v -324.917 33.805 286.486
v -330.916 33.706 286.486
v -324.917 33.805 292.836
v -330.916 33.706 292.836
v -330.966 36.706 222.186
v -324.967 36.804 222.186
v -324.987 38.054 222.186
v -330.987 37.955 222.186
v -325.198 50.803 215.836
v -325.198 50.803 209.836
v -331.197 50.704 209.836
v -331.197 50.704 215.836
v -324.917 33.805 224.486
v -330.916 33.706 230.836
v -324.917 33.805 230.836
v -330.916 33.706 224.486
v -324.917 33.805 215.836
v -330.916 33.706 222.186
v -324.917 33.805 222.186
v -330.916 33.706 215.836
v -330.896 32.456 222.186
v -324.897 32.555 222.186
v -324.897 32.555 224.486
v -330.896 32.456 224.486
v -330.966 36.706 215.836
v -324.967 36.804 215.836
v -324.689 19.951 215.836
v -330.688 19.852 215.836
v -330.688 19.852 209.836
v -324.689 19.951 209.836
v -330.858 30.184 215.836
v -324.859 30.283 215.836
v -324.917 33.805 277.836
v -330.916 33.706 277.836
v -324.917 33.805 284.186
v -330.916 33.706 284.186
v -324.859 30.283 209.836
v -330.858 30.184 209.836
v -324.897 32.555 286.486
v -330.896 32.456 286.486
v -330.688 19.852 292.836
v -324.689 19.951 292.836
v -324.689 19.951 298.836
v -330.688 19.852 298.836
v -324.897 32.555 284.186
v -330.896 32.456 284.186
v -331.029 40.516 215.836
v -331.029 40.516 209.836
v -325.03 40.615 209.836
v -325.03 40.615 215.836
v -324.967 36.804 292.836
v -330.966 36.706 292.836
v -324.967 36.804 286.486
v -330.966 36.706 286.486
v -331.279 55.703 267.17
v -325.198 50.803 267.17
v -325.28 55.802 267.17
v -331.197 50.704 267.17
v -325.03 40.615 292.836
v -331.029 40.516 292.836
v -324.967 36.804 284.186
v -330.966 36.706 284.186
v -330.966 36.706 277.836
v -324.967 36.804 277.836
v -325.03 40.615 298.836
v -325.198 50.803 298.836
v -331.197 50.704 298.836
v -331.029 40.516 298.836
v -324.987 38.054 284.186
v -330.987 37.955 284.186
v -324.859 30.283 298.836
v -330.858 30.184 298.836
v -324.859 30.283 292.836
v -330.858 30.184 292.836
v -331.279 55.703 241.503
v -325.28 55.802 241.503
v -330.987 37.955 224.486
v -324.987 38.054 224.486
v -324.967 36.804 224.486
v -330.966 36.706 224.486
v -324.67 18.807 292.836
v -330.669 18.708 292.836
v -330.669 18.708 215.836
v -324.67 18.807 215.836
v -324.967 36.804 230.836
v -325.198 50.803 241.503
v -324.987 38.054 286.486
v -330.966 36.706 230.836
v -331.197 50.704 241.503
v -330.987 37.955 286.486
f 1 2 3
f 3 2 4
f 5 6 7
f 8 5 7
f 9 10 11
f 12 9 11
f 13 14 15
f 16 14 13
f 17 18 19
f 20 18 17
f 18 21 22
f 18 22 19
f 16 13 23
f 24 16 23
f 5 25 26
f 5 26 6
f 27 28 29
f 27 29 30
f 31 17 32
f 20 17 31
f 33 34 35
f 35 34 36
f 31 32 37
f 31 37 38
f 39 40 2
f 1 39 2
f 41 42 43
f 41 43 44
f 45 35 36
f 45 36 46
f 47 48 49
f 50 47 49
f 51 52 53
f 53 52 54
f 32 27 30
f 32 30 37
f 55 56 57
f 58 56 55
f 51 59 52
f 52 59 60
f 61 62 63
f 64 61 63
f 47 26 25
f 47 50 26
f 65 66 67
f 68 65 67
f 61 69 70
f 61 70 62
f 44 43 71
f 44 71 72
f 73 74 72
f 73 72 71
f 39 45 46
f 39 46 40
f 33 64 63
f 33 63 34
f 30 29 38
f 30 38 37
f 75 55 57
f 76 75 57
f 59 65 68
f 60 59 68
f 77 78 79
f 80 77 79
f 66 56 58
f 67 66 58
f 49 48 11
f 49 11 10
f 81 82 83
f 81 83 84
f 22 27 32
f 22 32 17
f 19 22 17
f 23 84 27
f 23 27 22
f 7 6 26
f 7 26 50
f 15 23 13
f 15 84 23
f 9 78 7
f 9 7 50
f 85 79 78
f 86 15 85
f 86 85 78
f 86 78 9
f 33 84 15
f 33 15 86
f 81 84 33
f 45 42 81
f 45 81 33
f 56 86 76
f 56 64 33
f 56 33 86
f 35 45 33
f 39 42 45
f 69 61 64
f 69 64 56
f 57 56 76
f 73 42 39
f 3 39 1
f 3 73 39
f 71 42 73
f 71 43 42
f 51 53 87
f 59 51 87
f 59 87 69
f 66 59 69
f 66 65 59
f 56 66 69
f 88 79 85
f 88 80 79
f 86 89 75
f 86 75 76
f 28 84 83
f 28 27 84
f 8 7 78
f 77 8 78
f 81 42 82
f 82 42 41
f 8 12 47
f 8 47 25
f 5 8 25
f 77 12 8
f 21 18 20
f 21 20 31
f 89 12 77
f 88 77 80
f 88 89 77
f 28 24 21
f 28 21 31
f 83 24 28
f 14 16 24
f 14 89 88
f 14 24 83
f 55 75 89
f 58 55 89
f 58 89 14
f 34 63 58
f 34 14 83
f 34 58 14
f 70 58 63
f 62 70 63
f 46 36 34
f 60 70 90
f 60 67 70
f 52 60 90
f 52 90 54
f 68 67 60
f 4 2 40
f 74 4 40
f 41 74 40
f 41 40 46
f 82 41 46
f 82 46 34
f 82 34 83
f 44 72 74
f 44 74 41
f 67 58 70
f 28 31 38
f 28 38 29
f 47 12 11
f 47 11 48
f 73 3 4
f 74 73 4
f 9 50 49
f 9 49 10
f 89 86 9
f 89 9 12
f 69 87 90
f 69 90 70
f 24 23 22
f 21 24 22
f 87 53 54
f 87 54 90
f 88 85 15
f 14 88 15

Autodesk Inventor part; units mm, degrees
ref_plane "РабПлоскость1" through (-327.803629, 8.784154, 215.836479) normal (0, 0, 1) x (1, 0, 0)
sketch "Эскиз1" plane through (-327.803629, 8.784154, 215.836479) normal (0, 0, 1) x (1, 0, 0)
  line L0 (3.114831, 11.166777) -> (2.944416, 21.498705)
  line L1 (2.944416, 21.498705) -> (-3.054768, 21.399754)
  line L2 (-3.054768, 21.399754) -> (-2.884353, 11.067826)
  line L3 (-2.884353, 11.067826) -> (3.114831, 11.166777)
  line L4 (-3.393221, 41.919489) -> (-3.225183, 31.731682)
  line L5 (2.774001, 31.830633) -> (2.605963, 42.01844)
  line L6 (-3.225183, 31.731682) -> (2.774001, 31.830633)
  line L7 (2.605963, 42.01844) -> (-3.393221, 41.919489)
  line L8 (2.774001, 31.830633) -> (2.605963, 42.01844) construction
  line L9 (-3.393221, 41.919489) -> (-3.225183, 31.731682) construction
  line L10 (3.114831, 11.166777) -> (2.944416, 21.498705) construction
  line L11 (-3.054768, 21.399754) -> (-2.884353, 11.067826) construction
  line L12 (6.149374, 48.077701) -> (19.433282, 48.296806) construction
  line L13 (2.605963, 42.01844) -> (6.248325, 42.078517) construction
  point P0 (327.803629, -8.784154)
  dimension "d16" = 6
extrude "Выдавливание1" add sketch "Эскиз1" against normal blind 6
ref_plane "РабПлоскость2" through (-327.498735, 8.403036, 292.836479) normal (0, 0, -1) x (-0.999864, -0.0164918, 0)
sketch "Эскиз2" plane through (-327.498735, 8.403036, 292.836479) normal (0, 0, -1) x (-0.999864, -0.0164918, 0)
  line L0 (-3, 21.833317) -> (3, 21.833317)
  line L1 (3, 21.833317) -> (3, 11.499984)
  line L2 (3, 11.5) -> (-3, 11.5)
  line L3 (-3, 11.499984) -> (-3, 21.833317)
  line L4 (3, 32.16665) -> (-3, 32.16665)
  line L5 (-3, 32.16665) -> (-3, 42.355843)
  line L6 (-3, 42.5) -> (3, 42.5)
  line L7 (3, 42.355843) -> (3, 32.16665)
  line L8 (-3, 11.499984) -> (-3, 21.833317) construction
  line L9 (3, 21.833317) -> (3, 11.499984) construction
  line L10 (-3, 32.16665) -> (-3, 42.355843) construction
  line L11 (3, 42.355843) -> (3, 32.16665) construction
  point P0 (-327.315615, -13.802923)
sketch "Эскиз2 outline for Выдавливание2" plane through (-327.498735, 8.403036, 292.836479) normal (0, 0, -1) x (-0.999864, -0.0164918, 0)
  line L0 (3, 32.16665) -> (3, 42.355843)
  line L1 (-3, 32.16665) -> (3, 32.16665)
  line L2 (-3, 42.355843) -> (-3, 32.16665)
  line L3 (3, 42.355843) -> (-3, 42.355843)
  line L4 (-3, 21.833317) -> (-3, 11.499984)
  line L5 (3, 21.833317) -> (-3, 21.833317)
  line L6 (3, 11.499984) -> (3, 21.833317)
  line L7 (-3, 11.499984) -> (3, 11.499984)
extrude "Выдавливание2" add sketch "Эскиз2 outline for Выдавливание2" against normal blind 6
sketch "Эскиз3" plane through (-327.498735, 8.403036, 292.836479) normal (0, 0, -1) x (-0.999864, -0.0164918, 0)
  circle A0 centre (0, -7.644157) radius 18
  line L0 (6.642857, 42.355843) -> (3, 42.355843)
  line L1 (-3, 32.166667) -> (-3, 21.833333)
  line L2 (-3, 21.833333) -> (3, 21.833333)
  line L3 (3, 21.833333) -> (3, 32.166667)
  line L4 (3, 32.166667) -> (-3, 32.166667)
  line L5 (-3, 42.355843) -> (3, 42.355843)
  line L6 (3, 42.355843) -> (3, 10.355843)
  line L7 (3, 10.355843) -> (-3, 10.355843)
  line L8 (-3, 10.355843) -> (-3, 42.355843)
  point P0 (-327.315615, -13.802923)
  point P1 (-3, 21.833333)
  point P2 (3, 21.833333)
  point P3 (3, 42.355843)
extrude "Выдавливание3" add sketch "Эскиз3" along normal up to surface (77 mm away) contours L7 L8 L2 L6 | L2 L1 L4 L3 | L4 L8 L5 L6
sketch "Эскиз4" plane through (-331.19685, 50.703643, 209.836479) normal (-0.999864, -0.0164918, 0) x (0, 0, 1)
  line L0 (0, -14) -> (6, -14) construction
  line L1 (0, -17) -> (6, -17) construction
  line L2 (6, -17) -> (6, -14)
  line L3 (6, -14) -> (12.35, -14)
  line L4 (12.35, -14) -> (12.35, -12.75)
  line L5 (12.35, -12.75) -> (14.65, -12.75)
  line L6 (14.65, -12.75) -> (14.65, -14)
  line L7 (14.65, -14) -> (21, -14)
  line L8 (21, -14) -> (21, -17)
  line L9 (21, -17) -> (14.65, -17)
  line L10 (14.65, -17) -> (14.65, -18.25)
  line L11 (14.65, -18.25) -> (12.35, -18.25)
  line L12 (12.35, -18.25) -> (12.35, -17)
  line L13 (12.35, -17) -> (6, -17)
  line L14 (0, -20.522506) -> (0, -30.855843) construction
  line L15 (89, -10.189193) -> (89, 0) construction
  line L16 (0, -30.855843) -> (89, 0) construction
  line L17 (44.5, 0) -> (44.5, -30.855843) construction
  line L18 (89, -14) -> (83, -14) construction
  line L19 (89, -17) -> (83, -17) construction
  line L20 (83, -17) -> (83, -14)
  line L21 (83, -14) -> (76.65, -14)
  line L22 (76.65, -14) -> (76.65, -12.75)
  line L23 (76.65, -12.75) -> (74.35, -12.75)
  line L24 (74.35, -12.75) -> (74.35, -14)
  line L25 (74.35, -14) -> (68, -14)
  line L26 (68, -14) -> (68, -17)
  line L27 (68, -17) -> (74.35, -17)
  line L28 (74.35, -17) -> (74.35, -18.25)
  line L29 (74.35, -18.25) -> (76.65, -18.25)
  line L30 (76.65, -18.25) -> (76.65, -17)
  line L31 (76.65, -17) -> (83, -17)
  point P0 (-209.836479, -56.158766)
  point P1 (44.5, -15.427922)
  dimension "d9" = 2.3
  dimension "d10" = 5.5
  dimension "d11" = 15
extrude "Выдавливание4" cut sketch "Эскиз4" against normal blind 6
ref_plane "РабПлоскость3" through (-672.954973, 50.067364, -86.377936) normal (-0.0164918, 0.999864, 0) x (0, 0, 1)
sketch "Эскиз5" plane through (-331.19685, 50.703643, 292.636479) normal (-0.0164918, 0.999864, 0) x (0.999864, 0.0164918, 0)
  line L0 (6, 51.133333) -> (6, 25.466667)
  line L1 (0, 51.133333) -> (6, 51.133333)
  line L2 (0, 25.466667) -> (0, 51.133333)
  line L3 (6, 25.466667) -> (0, 25.466667)
  point P0 (330.315615, 292.636479)
extrude "Выдавливание5" add sketch "Эскиз5" along normal up to surface (5 mm away)
equation "\"d1\" = d0"
equation "\"d3\" = d0"
equation "\"d7\" = d0"
equation "\"d12\" = d3"
equation "\"d0\" = d16"
properties part number "motor1"
